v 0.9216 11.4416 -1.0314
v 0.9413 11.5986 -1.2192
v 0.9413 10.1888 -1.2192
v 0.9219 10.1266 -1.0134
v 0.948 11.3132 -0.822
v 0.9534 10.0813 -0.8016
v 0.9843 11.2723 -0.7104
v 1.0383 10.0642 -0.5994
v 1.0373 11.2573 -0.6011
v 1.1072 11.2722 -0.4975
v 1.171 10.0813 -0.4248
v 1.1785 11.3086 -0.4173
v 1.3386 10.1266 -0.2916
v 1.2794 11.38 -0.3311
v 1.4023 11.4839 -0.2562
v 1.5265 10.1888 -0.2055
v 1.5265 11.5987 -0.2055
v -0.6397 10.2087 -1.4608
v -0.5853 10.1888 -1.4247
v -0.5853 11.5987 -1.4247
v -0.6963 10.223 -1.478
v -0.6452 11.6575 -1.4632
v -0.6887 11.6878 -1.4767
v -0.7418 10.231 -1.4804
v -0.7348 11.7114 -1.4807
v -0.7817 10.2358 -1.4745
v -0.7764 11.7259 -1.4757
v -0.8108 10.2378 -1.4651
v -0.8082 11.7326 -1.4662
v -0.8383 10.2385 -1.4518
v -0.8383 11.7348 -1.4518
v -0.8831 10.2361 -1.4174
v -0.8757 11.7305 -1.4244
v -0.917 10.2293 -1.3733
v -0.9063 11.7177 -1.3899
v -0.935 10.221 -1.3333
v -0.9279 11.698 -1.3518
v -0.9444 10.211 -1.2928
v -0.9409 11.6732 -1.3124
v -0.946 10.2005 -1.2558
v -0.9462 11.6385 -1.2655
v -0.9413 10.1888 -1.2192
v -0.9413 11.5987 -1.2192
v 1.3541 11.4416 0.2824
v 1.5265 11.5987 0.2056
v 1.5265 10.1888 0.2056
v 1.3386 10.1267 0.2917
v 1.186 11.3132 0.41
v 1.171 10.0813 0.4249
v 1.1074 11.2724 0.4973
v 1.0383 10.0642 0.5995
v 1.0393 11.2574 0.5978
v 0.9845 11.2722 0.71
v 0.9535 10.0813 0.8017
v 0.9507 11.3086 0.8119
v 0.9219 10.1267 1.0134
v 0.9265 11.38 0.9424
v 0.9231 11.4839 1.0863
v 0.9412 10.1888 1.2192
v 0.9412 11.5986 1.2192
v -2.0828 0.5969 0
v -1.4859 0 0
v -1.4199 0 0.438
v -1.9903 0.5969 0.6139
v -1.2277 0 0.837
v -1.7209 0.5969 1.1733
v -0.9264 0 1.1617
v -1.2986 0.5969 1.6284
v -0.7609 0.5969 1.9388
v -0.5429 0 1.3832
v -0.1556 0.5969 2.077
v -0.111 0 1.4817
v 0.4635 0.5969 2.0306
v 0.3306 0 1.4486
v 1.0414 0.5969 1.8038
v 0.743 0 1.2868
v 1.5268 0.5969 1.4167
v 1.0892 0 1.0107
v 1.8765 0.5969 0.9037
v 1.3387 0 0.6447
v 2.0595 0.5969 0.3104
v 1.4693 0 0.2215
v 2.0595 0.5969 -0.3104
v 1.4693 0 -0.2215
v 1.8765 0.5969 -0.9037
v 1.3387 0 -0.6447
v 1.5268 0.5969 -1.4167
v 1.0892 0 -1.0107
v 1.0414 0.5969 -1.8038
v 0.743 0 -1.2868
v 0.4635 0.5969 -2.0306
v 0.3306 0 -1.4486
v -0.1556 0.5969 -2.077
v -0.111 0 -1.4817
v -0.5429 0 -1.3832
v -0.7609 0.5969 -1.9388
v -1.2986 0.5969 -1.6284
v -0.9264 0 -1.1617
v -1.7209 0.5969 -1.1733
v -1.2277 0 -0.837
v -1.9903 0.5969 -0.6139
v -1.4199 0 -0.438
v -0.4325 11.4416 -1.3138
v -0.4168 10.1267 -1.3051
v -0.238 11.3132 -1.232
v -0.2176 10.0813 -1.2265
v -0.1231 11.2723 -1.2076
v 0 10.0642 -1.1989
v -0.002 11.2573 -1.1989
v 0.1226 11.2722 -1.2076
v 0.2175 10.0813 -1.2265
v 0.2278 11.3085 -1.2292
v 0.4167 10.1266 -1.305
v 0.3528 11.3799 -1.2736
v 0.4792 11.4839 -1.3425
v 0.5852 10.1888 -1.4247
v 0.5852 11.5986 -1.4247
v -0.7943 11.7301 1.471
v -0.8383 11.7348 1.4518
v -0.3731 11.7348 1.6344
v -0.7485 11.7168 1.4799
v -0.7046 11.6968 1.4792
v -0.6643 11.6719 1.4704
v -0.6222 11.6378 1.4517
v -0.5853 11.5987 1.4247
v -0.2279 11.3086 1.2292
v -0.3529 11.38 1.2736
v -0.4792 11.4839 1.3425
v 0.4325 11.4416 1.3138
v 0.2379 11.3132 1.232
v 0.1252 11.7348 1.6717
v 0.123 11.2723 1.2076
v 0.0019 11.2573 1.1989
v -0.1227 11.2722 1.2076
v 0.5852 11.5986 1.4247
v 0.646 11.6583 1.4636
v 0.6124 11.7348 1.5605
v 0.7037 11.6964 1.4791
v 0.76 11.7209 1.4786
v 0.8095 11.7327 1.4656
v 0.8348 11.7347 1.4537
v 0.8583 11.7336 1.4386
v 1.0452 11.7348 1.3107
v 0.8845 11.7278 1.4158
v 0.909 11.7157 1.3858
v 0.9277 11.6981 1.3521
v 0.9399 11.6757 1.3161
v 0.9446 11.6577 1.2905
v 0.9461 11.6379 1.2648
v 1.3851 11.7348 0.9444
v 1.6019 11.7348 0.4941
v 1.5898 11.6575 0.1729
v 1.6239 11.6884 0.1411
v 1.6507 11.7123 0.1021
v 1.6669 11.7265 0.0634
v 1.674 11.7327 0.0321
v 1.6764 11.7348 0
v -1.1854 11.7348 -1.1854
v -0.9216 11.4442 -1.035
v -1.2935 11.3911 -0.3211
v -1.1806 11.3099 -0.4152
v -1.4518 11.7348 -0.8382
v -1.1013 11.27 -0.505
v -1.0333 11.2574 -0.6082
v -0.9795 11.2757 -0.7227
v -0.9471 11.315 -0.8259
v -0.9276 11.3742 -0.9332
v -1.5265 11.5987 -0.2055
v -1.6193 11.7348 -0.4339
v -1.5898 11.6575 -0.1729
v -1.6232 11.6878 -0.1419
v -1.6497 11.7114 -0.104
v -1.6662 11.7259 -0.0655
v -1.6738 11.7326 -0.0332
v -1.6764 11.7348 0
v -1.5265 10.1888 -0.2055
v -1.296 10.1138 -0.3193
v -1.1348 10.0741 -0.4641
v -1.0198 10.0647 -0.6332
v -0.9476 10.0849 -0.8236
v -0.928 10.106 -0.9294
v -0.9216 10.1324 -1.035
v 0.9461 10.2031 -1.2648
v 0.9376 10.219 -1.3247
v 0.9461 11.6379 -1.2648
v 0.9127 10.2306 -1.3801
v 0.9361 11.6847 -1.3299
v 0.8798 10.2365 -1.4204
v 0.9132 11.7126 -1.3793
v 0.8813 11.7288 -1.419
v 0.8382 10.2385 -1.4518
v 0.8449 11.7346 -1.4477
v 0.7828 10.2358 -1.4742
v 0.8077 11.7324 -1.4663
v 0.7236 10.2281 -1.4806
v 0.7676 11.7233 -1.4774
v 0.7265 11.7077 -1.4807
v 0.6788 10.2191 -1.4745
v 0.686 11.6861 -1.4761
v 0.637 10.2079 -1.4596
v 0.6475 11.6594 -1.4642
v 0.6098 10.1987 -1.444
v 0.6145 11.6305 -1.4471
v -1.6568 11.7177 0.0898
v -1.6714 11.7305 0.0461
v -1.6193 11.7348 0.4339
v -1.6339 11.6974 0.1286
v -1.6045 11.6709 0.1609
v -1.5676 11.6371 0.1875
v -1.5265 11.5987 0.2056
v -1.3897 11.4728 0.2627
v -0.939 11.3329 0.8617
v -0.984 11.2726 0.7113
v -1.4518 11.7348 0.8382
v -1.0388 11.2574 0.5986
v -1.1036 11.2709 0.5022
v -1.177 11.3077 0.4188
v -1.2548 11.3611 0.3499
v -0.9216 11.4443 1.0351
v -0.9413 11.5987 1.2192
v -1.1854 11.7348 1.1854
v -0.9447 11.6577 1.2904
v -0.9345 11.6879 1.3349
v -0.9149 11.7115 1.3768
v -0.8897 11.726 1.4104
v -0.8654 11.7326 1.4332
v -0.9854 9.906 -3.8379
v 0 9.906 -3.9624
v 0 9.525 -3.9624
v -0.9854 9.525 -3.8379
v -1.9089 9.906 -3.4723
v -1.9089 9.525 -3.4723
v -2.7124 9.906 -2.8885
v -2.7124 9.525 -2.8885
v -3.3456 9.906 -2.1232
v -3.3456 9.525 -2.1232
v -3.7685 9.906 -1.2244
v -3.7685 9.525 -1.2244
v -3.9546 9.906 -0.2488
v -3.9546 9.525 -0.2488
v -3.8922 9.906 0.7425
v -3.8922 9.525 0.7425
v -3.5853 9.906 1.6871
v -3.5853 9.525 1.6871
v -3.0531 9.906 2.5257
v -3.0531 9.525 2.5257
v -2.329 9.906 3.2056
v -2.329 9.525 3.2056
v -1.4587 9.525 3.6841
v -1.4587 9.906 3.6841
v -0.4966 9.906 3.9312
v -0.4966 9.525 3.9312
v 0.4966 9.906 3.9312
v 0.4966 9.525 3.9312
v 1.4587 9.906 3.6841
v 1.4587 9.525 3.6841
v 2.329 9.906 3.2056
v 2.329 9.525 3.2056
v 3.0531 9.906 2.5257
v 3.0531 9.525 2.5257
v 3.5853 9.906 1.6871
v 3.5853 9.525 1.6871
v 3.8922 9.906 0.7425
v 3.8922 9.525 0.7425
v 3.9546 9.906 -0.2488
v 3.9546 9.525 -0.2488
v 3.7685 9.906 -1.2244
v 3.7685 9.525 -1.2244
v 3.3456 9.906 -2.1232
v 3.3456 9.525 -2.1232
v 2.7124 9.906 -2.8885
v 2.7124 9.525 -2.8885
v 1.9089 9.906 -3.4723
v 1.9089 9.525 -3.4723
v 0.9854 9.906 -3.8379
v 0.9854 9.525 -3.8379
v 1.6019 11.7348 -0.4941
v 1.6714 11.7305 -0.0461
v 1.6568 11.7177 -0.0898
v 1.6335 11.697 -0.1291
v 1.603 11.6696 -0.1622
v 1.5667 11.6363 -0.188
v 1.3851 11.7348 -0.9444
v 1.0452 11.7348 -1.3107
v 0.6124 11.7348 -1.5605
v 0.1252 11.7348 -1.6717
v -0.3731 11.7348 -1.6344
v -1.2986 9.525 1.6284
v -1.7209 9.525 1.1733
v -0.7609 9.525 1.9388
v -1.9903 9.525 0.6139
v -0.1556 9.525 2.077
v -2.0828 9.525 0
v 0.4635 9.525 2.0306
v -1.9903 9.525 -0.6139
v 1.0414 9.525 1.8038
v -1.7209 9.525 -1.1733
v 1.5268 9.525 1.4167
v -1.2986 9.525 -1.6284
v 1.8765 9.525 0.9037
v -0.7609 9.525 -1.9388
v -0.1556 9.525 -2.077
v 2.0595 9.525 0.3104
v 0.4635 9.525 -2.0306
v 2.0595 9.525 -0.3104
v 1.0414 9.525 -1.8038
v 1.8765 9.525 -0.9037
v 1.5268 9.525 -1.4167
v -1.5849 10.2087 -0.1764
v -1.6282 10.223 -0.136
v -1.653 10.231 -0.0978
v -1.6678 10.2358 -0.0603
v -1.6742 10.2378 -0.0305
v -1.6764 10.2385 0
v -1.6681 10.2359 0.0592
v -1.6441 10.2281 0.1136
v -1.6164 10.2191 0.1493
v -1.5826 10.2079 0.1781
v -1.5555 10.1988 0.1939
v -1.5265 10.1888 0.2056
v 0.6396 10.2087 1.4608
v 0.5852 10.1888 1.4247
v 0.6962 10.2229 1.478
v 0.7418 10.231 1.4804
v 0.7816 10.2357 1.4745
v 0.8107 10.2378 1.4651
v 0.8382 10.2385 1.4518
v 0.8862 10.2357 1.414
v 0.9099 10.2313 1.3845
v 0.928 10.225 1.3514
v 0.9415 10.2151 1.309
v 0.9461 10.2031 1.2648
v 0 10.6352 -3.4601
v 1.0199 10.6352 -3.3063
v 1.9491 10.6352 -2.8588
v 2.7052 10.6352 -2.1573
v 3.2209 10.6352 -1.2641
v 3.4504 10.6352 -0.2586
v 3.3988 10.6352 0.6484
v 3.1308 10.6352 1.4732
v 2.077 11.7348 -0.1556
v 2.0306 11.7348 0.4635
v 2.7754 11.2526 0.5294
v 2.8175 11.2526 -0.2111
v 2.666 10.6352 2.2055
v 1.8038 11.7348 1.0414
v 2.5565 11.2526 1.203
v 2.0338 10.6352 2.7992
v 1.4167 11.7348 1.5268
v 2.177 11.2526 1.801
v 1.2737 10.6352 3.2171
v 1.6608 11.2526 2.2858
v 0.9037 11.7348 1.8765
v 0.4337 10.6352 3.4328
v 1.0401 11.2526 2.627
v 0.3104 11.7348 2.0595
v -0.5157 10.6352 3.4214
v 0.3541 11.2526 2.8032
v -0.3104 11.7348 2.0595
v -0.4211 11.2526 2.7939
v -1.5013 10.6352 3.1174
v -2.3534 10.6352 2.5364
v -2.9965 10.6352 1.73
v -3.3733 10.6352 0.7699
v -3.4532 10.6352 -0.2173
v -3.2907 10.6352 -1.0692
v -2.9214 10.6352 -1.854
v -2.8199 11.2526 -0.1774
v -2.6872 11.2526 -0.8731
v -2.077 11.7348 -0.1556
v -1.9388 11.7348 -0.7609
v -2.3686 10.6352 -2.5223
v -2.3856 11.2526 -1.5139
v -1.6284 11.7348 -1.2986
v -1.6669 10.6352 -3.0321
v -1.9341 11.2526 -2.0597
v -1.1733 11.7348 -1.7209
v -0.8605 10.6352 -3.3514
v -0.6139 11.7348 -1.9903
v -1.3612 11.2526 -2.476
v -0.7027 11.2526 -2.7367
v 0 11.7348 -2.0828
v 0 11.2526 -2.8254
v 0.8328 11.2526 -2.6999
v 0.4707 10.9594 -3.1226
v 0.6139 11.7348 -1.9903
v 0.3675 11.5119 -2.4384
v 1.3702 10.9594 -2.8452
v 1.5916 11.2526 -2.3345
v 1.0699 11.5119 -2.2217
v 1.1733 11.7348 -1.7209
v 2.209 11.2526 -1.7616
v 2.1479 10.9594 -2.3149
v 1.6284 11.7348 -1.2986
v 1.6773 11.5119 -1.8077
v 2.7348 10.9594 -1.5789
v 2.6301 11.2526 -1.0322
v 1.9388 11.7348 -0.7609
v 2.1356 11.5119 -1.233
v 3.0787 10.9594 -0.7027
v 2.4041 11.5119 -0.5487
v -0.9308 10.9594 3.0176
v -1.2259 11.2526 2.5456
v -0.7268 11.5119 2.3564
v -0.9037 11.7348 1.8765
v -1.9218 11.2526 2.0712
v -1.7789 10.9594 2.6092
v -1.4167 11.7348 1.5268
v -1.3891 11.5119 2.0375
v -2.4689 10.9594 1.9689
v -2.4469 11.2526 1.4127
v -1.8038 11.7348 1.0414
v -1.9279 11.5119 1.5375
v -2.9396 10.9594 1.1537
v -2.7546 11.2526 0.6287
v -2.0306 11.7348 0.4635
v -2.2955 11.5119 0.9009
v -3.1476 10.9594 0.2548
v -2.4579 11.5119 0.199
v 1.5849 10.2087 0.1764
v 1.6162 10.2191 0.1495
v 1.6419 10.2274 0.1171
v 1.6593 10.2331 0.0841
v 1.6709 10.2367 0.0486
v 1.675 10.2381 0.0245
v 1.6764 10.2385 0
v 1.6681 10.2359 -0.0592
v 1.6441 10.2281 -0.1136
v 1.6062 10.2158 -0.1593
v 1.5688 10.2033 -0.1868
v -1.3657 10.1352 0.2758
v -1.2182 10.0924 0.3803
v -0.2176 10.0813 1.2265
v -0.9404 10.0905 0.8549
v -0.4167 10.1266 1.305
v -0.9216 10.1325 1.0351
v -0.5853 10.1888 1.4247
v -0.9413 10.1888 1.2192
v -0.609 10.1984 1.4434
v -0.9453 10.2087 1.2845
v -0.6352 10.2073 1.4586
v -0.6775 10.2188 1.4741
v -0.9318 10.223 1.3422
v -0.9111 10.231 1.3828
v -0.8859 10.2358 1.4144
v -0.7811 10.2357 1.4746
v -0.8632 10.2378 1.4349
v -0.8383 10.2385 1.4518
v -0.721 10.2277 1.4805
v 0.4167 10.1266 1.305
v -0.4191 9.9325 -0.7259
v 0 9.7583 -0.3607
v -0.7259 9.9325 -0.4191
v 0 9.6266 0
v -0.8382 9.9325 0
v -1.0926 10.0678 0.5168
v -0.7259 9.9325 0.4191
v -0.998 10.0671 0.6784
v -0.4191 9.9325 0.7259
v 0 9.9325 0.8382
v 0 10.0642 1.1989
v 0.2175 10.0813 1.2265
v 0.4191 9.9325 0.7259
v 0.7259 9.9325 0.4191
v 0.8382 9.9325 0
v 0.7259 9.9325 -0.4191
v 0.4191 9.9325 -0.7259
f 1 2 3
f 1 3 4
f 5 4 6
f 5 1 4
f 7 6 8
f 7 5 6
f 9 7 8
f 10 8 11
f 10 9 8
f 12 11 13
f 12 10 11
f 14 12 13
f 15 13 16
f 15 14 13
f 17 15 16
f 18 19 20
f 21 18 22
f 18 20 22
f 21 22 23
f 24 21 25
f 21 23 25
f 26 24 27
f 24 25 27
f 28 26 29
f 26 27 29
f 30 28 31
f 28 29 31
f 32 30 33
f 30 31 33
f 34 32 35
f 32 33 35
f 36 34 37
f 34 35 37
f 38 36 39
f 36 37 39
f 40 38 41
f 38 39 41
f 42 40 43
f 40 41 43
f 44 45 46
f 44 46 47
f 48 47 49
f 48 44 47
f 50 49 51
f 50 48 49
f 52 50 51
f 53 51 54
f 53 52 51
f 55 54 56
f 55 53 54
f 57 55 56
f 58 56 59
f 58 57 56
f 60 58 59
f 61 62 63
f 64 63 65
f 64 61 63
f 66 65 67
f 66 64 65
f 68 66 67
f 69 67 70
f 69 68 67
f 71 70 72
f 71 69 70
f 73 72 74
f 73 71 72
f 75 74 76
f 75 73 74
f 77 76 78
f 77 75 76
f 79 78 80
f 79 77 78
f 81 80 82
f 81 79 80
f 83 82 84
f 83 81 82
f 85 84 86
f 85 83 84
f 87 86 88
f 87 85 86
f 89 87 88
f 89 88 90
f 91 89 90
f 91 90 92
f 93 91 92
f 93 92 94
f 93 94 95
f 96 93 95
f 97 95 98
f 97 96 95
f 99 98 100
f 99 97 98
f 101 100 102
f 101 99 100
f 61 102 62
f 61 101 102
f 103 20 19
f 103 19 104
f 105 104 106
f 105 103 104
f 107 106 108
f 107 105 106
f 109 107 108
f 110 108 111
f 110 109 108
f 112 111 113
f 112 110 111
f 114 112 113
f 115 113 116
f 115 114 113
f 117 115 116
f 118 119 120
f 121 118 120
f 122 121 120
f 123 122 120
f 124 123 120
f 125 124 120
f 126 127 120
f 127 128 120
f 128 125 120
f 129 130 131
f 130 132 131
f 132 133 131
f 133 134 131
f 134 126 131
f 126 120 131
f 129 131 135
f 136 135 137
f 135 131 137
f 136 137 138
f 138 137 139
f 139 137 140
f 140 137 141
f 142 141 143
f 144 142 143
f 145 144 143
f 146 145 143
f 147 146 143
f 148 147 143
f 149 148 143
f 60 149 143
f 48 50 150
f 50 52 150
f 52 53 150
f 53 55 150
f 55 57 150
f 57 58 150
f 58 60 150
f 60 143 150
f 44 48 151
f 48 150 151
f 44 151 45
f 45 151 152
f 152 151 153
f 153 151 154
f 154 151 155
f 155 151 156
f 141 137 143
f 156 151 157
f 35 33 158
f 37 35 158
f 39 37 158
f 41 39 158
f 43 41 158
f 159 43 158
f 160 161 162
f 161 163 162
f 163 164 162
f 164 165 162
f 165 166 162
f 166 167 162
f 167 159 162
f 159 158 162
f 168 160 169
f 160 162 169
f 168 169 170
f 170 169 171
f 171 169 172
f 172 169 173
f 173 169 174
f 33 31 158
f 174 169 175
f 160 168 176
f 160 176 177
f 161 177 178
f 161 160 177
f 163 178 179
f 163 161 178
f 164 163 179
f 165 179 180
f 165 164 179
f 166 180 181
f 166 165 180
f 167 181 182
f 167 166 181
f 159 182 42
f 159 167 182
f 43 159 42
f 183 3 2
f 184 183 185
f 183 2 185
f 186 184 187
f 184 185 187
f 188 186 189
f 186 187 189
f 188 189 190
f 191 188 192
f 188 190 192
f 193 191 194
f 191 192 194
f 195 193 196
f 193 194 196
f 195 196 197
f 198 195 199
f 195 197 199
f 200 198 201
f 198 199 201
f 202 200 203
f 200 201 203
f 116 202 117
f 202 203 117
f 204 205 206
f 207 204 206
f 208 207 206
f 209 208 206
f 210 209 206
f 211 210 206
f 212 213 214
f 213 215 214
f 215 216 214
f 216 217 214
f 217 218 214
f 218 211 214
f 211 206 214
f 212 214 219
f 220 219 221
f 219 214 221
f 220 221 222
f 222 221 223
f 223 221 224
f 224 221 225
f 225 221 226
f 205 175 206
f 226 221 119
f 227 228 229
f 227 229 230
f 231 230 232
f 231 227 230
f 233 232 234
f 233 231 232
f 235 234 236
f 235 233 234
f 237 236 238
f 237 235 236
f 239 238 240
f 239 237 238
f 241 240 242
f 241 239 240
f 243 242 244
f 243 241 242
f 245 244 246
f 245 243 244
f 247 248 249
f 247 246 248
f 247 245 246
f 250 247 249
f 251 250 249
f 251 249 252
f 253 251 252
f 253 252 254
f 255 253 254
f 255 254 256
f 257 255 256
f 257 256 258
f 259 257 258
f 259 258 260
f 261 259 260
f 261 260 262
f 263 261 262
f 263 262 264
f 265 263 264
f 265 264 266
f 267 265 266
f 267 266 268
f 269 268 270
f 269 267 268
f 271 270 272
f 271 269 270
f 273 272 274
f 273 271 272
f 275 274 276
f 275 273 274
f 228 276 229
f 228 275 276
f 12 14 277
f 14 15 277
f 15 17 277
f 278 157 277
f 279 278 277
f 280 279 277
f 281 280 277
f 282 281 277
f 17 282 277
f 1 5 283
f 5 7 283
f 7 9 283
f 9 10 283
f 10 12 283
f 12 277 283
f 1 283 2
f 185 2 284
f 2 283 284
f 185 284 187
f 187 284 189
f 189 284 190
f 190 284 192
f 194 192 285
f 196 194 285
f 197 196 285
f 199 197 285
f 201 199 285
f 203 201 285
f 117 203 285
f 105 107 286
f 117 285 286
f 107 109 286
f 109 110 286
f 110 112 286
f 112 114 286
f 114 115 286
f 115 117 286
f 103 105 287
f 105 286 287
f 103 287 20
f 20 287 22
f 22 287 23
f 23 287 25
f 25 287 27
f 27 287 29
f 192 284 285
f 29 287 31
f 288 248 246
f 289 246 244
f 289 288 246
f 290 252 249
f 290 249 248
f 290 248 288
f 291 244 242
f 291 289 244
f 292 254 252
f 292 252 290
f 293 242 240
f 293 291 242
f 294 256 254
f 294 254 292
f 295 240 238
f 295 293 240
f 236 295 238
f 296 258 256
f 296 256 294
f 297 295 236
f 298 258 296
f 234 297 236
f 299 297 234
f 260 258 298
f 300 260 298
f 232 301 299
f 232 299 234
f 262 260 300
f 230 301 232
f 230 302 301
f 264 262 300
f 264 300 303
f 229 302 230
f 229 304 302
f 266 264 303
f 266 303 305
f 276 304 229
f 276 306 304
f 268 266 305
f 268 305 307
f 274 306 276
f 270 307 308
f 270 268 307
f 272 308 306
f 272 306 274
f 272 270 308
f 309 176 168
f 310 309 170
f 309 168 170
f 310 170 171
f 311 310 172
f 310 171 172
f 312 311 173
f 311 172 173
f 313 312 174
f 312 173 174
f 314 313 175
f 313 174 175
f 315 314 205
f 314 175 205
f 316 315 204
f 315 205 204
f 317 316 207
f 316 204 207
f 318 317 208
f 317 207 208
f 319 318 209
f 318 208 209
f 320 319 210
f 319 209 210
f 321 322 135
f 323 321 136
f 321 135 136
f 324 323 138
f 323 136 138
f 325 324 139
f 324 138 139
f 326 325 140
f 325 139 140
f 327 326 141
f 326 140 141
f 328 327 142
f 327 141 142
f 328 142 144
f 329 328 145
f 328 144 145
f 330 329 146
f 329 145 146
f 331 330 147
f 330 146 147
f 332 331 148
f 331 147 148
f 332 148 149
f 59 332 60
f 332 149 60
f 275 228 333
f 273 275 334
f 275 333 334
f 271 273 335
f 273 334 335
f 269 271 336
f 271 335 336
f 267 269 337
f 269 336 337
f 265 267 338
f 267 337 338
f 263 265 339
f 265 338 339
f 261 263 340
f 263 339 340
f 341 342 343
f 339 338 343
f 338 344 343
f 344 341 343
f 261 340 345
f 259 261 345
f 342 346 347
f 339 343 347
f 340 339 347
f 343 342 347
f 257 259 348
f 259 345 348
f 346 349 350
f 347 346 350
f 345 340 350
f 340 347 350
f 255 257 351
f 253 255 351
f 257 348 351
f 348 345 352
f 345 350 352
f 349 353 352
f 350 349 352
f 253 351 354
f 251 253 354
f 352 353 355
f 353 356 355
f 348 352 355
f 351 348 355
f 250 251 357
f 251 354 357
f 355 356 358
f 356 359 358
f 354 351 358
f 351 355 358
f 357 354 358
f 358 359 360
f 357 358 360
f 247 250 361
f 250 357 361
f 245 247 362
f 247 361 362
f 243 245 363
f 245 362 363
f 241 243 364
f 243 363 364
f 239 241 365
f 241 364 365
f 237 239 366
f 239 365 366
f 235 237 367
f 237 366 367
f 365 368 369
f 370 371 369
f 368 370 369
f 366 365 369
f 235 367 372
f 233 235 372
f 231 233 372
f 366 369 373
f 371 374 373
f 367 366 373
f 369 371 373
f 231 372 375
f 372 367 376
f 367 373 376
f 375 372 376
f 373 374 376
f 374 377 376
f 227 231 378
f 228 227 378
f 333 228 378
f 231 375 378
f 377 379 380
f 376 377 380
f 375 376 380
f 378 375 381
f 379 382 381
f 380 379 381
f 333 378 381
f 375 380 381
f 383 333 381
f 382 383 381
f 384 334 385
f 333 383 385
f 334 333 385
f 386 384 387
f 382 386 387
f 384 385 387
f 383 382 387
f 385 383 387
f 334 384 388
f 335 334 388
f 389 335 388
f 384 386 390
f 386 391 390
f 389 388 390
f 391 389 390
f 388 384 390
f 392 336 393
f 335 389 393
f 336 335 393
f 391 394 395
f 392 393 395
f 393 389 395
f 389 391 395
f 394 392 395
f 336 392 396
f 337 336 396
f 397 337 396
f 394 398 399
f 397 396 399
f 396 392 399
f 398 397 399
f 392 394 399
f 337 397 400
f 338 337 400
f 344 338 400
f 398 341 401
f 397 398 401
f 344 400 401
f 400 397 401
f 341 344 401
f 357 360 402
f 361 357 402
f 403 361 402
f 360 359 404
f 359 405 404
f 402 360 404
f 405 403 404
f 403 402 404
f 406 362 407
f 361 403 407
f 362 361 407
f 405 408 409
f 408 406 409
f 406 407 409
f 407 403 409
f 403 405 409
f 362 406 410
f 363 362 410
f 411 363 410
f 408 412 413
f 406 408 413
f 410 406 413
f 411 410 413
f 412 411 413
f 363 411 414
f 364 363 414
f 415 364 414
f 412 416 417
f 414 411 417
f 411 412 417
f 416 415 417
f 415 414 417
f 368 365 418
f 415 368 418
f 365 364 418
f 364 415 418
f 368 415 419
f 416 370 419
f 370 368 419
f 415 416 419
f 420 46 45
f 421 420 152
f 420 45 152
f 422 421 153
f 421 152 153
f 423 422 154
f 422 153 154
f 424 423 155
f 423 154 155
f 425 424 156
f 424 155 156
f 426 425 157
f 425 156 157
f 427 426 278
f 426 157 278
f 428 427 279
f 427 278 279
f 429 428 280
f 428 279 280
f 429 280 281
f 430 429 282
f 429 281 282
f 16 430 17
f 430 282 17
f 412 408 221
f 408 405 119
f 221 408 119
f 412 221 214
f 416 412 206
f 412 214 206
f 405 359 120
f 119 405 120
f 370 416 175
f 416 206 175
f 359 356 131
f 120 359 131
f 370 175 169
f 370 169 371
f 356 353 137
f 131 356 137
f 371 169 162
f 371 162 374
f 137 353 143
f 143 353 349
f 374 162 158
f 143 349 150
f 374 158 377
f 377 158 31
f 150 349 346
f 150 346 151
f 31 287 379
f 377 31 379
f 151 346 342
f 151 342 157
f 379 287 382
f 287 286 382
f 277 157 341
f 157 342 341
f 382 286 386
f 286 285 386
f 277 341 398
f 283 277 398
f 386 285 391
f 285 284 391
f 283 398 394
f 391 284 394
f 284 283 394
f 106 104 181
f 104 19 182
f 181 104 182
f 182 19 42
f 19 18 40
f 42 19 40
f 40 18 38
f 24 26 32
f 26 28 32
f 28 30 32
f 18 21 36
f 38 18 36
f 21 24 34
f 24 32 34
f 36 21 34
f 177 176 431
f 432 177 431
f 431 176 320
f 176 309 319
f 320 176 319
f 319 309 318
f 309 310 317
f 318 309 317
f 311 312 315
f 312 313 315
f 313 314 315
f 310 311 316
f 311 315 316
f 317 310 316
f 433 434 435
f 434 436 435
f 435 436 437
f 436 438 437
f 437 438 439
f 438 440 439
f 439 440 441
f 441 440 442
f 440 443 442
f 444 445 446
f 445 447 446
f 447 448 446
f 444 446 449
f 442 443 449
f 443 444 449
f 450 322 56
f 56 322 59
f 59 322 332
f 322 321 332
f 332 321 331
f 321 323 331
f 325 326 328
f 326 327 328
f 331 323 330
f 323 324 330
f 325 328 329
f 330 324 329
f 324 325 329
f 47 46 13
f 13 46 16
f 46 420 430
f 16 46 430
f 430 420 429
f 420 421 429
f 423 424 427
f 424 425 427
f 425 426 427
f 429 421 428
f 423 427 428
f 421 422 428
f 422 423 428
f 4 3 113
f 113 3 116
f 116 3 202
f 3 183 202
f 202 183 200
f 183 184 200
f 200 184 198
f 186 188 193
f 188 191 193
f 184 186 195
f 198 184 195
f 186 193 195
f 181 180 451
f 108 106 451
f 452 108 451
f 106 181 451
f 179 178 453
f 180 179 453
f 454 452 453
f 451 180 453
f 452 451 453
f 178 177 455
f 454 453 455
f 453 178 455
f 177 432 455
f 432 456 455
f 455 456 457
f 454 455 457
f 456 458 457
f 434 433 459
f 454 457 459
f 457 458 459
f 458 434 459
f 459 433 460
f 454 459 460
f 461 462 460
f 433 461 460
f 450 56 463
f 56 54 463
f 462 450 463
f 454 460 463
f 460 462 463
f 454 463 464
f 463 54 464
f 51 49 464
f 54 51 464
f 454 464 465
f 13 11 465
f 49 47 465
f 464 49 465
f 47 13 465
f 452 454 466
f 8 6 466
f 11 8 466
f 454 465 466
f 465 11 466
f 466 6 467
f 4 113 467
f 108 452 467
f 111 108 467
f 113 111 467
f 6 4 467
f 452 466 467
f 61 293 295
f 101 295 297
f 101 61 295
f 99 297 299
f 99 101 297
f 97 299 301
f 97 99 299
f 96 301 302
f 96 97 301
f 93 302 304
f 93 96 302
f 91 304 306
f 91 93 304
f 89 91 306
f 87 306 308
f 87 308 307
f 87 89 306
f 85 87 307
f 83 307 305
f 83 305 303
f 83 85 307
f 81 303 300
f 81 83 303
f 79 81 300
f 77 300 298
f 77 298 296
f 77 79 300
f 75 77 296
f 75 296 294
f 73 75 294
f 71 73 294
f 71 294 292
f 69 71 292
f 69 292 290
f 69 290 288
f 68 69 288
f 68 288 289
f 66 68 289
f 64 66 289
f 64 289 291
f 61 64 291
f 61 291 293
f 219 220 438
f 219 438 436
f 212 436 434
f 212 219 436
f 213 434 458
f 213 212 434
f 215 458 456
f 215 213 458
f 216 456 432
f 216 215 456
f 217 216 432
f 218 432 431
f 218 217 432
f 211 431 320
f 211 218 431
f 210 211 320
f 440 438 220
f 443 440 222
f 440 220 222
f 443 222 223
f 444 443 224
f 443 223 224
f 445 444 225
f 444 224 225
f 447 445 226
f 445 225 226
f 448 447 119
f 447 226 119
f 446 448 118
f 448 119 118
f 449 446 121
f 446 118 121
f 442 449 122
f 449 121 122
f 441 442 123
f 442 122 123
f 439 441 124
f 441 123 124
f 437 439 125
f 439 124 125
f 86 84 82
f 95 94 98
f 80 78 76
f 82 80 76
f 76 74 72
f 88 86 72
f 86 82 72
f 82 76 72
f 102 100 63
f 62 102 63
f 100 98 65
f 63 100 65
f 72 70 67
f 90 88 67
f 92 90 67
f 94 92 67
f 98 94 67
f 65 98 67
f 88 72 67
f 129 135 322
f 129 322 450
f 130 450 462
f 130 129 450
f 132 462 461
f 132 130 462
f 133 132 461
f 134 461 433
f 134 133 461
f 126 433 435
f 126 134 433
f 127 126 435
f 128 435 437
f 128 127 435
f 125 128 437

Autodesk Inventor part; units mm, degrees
ref_plane "YZ Plane" through (0, 0, 0) normal (1, 0, 0) x (0, 1, 0)
ref_plane "XZ Plane" through (0, 0, 0) normal (0, 1, 0) x (-1, 0, 0)
ref_plane "XY Plane" through (0, 0, 0) normal (0, 0, 1) x (1, 0, 0)
sketch "Sketch1" plane through (0, 0, 0) normal (0, 1, 0) x (-1, 0, 0)
  circle A0 centre (0, 0) radius 2.0828
  dimension "d4" = 4.1656
extrude "Body" add sketch "Sketch1" along normal blind 9.525
sketch "Sketch2" plane through (0, 0, 0) normal (1, 0, 0) x (0, 1, 0)
  line L0 (9.525, -2.0828) -> (9.525, 2.0828) projected
  line L1 (9.525, 0) -> (9.525, -3.9624)
  line L2 (9.525, -3.9624) -> (9.906, -3.9624)
  arc A0 (9.906, -3.9624) -> (11.7348, -2.0828) centre (7.7138, 0) ccw
  line L3 (11.7348, -2.0828) -> (11.7348, -1.6764)
  line L4 (11.7348, -1.6764) -> (10.2385, -1.6764)
  line L5 (10.2385, -1.6764) -> (9.6266, 0)
  line L6 (9.6266, 0) -> (9.525, 0)
  point P0 (0, 0)
  dimension "d5" = 3.9624
  dimension "d6" = 0.381
  dimension "d13" = 0.1016
  dimension "d14" = 2.0828
  dimension "d15" = 2.2098
  dimension "d16" = 0
  dimension "d17" = 1.6764
  dimension "d57" = 20.053
revolve "Head" add sketch "Sketch2" angle 360 about axis through (0, 9.6266, 0) along (0, -1, 0)
sketch "Sketch3" plane through (0, 11.7348, 0) normal (0, 1, 0) x (1, 0, 0)
  circle A0 centre (0, 0) radius 1.6764 projected
  line L0 (0.7302, -1.2648) -> (-0.7303, -1.2648) construction
  line L1 (-0.7303, -1.2648) -> (-1.4605, 0) construction
  line L2 (-1.4605, 0) -> (-0.7303, 1.2648) construction
  line L3 (-0.7303, 1.2648) -> (0.7302, 1.2648) construction
  line L4 (0.7302, 1.2648) -> (1.4605, 0) construction
  line L5 (1.4605, 0) -> (0.7302, -1.2648) construction
  circle A1 centre (-0.7303, -1.2648) radius 0.2159
  circle A2 centre (-1.4605, 0) radius 0.2159
  circle A3 centre (-0.7303, 1.2648) radius 0.2159
  circle A4 centre (0.7302, 1.2648) radius 0.2159
  circle A5 centre (1.4605, 0) radius 0.2159
  circle A6 centre (0.7302, -1.2648) radius 0.2159
  circle A7 centre (0, -2.0701) radius 0.8712
  circle A8 centre (0, 2.0701) radius 0.8712
  circle A9 centre (1.7928, -1.0351) radius 0.8712
  circle A10 centre (-1.7928, 1.035) radius 0.8712
  circle A11 centre (1.7928, 1.035) radius 0.8712
  circle A12 centre (-1.7928, -1.0351) radius 0.8712
  circle A13 centre (0, 0) radius 1.8188
  point P0 (0, 0)
  point P1 (0, 0)
  point P2 (0.9413, 1.2192)
  point P3 (1.5265, 0.2056)
  point P4 (1.5265, -0.2056)
  point P5 (0.9413, -1.2192)
  point P6 (0.5852, -1.4248)
  point P7 (-0.5852, -1.4248)
  point P8 (-0.9413, -1.2192)
  point P9 (-1.5265, -0.2056)
  point P10 (-1.5265, 0.2056)
  point P11 (-0.9413, 1.2192)
  point P12 (-0.5852, 1.4248)
  point P13 (0.5852, 1.4248)
  dimension "d58" = 2.921
  dimension "d59" = 4.1402
  dimension "d62" = 120
extrude "Hex" add sketch "Sketch3" against normal blind 1.778 contours A5 A11 A0 | A0 A11 A13 A9 | A0 A9 A5 | A11 A0 | A0 A11 A13 | A9 A13 A0 | A0 A9 | A11 A4 A0 | A0 A8 A13 A11 | A9 A13 A7 A0 | A0 A6 A9 | A4 A8 A0 | A0 A7 A6 | A8 A0 | A7 A0 | A0 A8 A13 | A7 A13 A0 | A3 A0 A8 | A7 A0 A1 | A0 A10 A13 A8 | A7 A13 A12 A0 | A3 A10 A0 | A0 A12 A1 | A10 A0 A13 | A13 A12 A0 | A10 A0 | A0 A12 | A10 A0 A12 A13 | A10 A2 A0 | A0 A2 A12
sketch "Sketch4" plane through (0, 0, 0) normal (0, 0, 1) x (1, 0, 0)
  line L0 (-0.7364, 10.7948) -> (-1.6764, 11.7348)
  line L1 (0, 11.7348) -> (-0.7364, 10.7948)
  line L2 (0, -1.712) -> (0, 10.2718) projected
  line L3 (-1.5265, 11.7348) -> (-1.5265, 10.1888) projected
  line L4 (-1.5265, 11.7348) -> (-1.5265, 11.7348) projected
  line L5 (-1.5265, 11.7348) -> (-1.5265, 10.1888) projected
  line L6 (-1.6764, 11.7348) -> (-1.5265, 11.7348) projected
  line L7 (-1.6764, 11.7348) -> (0, 11.7348)
  point P0 (0, 0)
  point P1 (-1.6764, 10.2385)
  dimension "d29" = 1.6764
revolve "Head Chamfer" cut sketch "Sketch4" angle 360 about axis through (0, -10, 0) along (0, 1, 0)
sketch "Sketch5" plane through (0, 0, 0) normal (1, 0, 0) x (0, 1, 0)
  line L0 (0, -2.0828) -> (9.525, -2.0828) projected
  line L1 (9.525, 3.9624) -> (9.525, -3.9624) projected
  line L2 (9.525, -2.0828) -> (9.525, 2.0828) projected
  line L3 (0.0745, -2.0828) -> (-0.2261, -2.6035)
  line L4 (-0.2261, -2.6035) -> (-0.3253, -2.6035)
  line L5 (-0.3253, -2.6035) -> (-0.626, -2.0828)
  line L6 (0.0686, -2.6035) -> (-0.7252, -2.6035) construction
  line L7 (-0.626, -2.0828) -> (0.0745, -2.0828)
  line L8 (0, -2.0828) -> (9.525, -2.0828) projected
  point P0 (0, 0)
  dimension "d31" = 30
  dimension "d32" = 60
  dimension "a" = 0.0992
  dimension "d46" = 0.7937
  dimension "d54" = 0.0686
  dimension "d55" = 0.5207
  dimension "d56" = 0.0992
feature "Thread" [suppressed]
sketch "Sketch6" plane through (0, 0, 0) normal (0, 0, 1) x (1, 0, 0)
  line L0 (0, 0) -> (-1.4859, 0)
  line L1 (2.0828, 0) -> (-2.0828, 0) projected
  line L2 (-1.4859, 0) -> (-2.4948, 1.0089)
  line L3 (-2.4948, 1.0089) -> (-2.9651, -1.2188)
  line L4 (-2.9651, -1.2188) -> (-1.4859, -1.2188)
  line L5 (-2.0828, 0) -> (-2.0828, 9.525) projected
  line L6 (-1.4859, -1.2188) -> (-1.4859, 0)
  line L7 (0, -2.7326) -> (0, 7.8638) projected
  point P0 (-2.0828, 0.5969)
  dimension "d49" = 1.4859
  dimension "d50" = 135
revolve "Tapered End" cut sketch "Sketch6" angle 360 about axis through (0, -10, 0) along (0, 1, 0)
equation "\"d56\" = a"
properties part number "Screw 8-32 Steel 2.500" material "VEX Steel"
